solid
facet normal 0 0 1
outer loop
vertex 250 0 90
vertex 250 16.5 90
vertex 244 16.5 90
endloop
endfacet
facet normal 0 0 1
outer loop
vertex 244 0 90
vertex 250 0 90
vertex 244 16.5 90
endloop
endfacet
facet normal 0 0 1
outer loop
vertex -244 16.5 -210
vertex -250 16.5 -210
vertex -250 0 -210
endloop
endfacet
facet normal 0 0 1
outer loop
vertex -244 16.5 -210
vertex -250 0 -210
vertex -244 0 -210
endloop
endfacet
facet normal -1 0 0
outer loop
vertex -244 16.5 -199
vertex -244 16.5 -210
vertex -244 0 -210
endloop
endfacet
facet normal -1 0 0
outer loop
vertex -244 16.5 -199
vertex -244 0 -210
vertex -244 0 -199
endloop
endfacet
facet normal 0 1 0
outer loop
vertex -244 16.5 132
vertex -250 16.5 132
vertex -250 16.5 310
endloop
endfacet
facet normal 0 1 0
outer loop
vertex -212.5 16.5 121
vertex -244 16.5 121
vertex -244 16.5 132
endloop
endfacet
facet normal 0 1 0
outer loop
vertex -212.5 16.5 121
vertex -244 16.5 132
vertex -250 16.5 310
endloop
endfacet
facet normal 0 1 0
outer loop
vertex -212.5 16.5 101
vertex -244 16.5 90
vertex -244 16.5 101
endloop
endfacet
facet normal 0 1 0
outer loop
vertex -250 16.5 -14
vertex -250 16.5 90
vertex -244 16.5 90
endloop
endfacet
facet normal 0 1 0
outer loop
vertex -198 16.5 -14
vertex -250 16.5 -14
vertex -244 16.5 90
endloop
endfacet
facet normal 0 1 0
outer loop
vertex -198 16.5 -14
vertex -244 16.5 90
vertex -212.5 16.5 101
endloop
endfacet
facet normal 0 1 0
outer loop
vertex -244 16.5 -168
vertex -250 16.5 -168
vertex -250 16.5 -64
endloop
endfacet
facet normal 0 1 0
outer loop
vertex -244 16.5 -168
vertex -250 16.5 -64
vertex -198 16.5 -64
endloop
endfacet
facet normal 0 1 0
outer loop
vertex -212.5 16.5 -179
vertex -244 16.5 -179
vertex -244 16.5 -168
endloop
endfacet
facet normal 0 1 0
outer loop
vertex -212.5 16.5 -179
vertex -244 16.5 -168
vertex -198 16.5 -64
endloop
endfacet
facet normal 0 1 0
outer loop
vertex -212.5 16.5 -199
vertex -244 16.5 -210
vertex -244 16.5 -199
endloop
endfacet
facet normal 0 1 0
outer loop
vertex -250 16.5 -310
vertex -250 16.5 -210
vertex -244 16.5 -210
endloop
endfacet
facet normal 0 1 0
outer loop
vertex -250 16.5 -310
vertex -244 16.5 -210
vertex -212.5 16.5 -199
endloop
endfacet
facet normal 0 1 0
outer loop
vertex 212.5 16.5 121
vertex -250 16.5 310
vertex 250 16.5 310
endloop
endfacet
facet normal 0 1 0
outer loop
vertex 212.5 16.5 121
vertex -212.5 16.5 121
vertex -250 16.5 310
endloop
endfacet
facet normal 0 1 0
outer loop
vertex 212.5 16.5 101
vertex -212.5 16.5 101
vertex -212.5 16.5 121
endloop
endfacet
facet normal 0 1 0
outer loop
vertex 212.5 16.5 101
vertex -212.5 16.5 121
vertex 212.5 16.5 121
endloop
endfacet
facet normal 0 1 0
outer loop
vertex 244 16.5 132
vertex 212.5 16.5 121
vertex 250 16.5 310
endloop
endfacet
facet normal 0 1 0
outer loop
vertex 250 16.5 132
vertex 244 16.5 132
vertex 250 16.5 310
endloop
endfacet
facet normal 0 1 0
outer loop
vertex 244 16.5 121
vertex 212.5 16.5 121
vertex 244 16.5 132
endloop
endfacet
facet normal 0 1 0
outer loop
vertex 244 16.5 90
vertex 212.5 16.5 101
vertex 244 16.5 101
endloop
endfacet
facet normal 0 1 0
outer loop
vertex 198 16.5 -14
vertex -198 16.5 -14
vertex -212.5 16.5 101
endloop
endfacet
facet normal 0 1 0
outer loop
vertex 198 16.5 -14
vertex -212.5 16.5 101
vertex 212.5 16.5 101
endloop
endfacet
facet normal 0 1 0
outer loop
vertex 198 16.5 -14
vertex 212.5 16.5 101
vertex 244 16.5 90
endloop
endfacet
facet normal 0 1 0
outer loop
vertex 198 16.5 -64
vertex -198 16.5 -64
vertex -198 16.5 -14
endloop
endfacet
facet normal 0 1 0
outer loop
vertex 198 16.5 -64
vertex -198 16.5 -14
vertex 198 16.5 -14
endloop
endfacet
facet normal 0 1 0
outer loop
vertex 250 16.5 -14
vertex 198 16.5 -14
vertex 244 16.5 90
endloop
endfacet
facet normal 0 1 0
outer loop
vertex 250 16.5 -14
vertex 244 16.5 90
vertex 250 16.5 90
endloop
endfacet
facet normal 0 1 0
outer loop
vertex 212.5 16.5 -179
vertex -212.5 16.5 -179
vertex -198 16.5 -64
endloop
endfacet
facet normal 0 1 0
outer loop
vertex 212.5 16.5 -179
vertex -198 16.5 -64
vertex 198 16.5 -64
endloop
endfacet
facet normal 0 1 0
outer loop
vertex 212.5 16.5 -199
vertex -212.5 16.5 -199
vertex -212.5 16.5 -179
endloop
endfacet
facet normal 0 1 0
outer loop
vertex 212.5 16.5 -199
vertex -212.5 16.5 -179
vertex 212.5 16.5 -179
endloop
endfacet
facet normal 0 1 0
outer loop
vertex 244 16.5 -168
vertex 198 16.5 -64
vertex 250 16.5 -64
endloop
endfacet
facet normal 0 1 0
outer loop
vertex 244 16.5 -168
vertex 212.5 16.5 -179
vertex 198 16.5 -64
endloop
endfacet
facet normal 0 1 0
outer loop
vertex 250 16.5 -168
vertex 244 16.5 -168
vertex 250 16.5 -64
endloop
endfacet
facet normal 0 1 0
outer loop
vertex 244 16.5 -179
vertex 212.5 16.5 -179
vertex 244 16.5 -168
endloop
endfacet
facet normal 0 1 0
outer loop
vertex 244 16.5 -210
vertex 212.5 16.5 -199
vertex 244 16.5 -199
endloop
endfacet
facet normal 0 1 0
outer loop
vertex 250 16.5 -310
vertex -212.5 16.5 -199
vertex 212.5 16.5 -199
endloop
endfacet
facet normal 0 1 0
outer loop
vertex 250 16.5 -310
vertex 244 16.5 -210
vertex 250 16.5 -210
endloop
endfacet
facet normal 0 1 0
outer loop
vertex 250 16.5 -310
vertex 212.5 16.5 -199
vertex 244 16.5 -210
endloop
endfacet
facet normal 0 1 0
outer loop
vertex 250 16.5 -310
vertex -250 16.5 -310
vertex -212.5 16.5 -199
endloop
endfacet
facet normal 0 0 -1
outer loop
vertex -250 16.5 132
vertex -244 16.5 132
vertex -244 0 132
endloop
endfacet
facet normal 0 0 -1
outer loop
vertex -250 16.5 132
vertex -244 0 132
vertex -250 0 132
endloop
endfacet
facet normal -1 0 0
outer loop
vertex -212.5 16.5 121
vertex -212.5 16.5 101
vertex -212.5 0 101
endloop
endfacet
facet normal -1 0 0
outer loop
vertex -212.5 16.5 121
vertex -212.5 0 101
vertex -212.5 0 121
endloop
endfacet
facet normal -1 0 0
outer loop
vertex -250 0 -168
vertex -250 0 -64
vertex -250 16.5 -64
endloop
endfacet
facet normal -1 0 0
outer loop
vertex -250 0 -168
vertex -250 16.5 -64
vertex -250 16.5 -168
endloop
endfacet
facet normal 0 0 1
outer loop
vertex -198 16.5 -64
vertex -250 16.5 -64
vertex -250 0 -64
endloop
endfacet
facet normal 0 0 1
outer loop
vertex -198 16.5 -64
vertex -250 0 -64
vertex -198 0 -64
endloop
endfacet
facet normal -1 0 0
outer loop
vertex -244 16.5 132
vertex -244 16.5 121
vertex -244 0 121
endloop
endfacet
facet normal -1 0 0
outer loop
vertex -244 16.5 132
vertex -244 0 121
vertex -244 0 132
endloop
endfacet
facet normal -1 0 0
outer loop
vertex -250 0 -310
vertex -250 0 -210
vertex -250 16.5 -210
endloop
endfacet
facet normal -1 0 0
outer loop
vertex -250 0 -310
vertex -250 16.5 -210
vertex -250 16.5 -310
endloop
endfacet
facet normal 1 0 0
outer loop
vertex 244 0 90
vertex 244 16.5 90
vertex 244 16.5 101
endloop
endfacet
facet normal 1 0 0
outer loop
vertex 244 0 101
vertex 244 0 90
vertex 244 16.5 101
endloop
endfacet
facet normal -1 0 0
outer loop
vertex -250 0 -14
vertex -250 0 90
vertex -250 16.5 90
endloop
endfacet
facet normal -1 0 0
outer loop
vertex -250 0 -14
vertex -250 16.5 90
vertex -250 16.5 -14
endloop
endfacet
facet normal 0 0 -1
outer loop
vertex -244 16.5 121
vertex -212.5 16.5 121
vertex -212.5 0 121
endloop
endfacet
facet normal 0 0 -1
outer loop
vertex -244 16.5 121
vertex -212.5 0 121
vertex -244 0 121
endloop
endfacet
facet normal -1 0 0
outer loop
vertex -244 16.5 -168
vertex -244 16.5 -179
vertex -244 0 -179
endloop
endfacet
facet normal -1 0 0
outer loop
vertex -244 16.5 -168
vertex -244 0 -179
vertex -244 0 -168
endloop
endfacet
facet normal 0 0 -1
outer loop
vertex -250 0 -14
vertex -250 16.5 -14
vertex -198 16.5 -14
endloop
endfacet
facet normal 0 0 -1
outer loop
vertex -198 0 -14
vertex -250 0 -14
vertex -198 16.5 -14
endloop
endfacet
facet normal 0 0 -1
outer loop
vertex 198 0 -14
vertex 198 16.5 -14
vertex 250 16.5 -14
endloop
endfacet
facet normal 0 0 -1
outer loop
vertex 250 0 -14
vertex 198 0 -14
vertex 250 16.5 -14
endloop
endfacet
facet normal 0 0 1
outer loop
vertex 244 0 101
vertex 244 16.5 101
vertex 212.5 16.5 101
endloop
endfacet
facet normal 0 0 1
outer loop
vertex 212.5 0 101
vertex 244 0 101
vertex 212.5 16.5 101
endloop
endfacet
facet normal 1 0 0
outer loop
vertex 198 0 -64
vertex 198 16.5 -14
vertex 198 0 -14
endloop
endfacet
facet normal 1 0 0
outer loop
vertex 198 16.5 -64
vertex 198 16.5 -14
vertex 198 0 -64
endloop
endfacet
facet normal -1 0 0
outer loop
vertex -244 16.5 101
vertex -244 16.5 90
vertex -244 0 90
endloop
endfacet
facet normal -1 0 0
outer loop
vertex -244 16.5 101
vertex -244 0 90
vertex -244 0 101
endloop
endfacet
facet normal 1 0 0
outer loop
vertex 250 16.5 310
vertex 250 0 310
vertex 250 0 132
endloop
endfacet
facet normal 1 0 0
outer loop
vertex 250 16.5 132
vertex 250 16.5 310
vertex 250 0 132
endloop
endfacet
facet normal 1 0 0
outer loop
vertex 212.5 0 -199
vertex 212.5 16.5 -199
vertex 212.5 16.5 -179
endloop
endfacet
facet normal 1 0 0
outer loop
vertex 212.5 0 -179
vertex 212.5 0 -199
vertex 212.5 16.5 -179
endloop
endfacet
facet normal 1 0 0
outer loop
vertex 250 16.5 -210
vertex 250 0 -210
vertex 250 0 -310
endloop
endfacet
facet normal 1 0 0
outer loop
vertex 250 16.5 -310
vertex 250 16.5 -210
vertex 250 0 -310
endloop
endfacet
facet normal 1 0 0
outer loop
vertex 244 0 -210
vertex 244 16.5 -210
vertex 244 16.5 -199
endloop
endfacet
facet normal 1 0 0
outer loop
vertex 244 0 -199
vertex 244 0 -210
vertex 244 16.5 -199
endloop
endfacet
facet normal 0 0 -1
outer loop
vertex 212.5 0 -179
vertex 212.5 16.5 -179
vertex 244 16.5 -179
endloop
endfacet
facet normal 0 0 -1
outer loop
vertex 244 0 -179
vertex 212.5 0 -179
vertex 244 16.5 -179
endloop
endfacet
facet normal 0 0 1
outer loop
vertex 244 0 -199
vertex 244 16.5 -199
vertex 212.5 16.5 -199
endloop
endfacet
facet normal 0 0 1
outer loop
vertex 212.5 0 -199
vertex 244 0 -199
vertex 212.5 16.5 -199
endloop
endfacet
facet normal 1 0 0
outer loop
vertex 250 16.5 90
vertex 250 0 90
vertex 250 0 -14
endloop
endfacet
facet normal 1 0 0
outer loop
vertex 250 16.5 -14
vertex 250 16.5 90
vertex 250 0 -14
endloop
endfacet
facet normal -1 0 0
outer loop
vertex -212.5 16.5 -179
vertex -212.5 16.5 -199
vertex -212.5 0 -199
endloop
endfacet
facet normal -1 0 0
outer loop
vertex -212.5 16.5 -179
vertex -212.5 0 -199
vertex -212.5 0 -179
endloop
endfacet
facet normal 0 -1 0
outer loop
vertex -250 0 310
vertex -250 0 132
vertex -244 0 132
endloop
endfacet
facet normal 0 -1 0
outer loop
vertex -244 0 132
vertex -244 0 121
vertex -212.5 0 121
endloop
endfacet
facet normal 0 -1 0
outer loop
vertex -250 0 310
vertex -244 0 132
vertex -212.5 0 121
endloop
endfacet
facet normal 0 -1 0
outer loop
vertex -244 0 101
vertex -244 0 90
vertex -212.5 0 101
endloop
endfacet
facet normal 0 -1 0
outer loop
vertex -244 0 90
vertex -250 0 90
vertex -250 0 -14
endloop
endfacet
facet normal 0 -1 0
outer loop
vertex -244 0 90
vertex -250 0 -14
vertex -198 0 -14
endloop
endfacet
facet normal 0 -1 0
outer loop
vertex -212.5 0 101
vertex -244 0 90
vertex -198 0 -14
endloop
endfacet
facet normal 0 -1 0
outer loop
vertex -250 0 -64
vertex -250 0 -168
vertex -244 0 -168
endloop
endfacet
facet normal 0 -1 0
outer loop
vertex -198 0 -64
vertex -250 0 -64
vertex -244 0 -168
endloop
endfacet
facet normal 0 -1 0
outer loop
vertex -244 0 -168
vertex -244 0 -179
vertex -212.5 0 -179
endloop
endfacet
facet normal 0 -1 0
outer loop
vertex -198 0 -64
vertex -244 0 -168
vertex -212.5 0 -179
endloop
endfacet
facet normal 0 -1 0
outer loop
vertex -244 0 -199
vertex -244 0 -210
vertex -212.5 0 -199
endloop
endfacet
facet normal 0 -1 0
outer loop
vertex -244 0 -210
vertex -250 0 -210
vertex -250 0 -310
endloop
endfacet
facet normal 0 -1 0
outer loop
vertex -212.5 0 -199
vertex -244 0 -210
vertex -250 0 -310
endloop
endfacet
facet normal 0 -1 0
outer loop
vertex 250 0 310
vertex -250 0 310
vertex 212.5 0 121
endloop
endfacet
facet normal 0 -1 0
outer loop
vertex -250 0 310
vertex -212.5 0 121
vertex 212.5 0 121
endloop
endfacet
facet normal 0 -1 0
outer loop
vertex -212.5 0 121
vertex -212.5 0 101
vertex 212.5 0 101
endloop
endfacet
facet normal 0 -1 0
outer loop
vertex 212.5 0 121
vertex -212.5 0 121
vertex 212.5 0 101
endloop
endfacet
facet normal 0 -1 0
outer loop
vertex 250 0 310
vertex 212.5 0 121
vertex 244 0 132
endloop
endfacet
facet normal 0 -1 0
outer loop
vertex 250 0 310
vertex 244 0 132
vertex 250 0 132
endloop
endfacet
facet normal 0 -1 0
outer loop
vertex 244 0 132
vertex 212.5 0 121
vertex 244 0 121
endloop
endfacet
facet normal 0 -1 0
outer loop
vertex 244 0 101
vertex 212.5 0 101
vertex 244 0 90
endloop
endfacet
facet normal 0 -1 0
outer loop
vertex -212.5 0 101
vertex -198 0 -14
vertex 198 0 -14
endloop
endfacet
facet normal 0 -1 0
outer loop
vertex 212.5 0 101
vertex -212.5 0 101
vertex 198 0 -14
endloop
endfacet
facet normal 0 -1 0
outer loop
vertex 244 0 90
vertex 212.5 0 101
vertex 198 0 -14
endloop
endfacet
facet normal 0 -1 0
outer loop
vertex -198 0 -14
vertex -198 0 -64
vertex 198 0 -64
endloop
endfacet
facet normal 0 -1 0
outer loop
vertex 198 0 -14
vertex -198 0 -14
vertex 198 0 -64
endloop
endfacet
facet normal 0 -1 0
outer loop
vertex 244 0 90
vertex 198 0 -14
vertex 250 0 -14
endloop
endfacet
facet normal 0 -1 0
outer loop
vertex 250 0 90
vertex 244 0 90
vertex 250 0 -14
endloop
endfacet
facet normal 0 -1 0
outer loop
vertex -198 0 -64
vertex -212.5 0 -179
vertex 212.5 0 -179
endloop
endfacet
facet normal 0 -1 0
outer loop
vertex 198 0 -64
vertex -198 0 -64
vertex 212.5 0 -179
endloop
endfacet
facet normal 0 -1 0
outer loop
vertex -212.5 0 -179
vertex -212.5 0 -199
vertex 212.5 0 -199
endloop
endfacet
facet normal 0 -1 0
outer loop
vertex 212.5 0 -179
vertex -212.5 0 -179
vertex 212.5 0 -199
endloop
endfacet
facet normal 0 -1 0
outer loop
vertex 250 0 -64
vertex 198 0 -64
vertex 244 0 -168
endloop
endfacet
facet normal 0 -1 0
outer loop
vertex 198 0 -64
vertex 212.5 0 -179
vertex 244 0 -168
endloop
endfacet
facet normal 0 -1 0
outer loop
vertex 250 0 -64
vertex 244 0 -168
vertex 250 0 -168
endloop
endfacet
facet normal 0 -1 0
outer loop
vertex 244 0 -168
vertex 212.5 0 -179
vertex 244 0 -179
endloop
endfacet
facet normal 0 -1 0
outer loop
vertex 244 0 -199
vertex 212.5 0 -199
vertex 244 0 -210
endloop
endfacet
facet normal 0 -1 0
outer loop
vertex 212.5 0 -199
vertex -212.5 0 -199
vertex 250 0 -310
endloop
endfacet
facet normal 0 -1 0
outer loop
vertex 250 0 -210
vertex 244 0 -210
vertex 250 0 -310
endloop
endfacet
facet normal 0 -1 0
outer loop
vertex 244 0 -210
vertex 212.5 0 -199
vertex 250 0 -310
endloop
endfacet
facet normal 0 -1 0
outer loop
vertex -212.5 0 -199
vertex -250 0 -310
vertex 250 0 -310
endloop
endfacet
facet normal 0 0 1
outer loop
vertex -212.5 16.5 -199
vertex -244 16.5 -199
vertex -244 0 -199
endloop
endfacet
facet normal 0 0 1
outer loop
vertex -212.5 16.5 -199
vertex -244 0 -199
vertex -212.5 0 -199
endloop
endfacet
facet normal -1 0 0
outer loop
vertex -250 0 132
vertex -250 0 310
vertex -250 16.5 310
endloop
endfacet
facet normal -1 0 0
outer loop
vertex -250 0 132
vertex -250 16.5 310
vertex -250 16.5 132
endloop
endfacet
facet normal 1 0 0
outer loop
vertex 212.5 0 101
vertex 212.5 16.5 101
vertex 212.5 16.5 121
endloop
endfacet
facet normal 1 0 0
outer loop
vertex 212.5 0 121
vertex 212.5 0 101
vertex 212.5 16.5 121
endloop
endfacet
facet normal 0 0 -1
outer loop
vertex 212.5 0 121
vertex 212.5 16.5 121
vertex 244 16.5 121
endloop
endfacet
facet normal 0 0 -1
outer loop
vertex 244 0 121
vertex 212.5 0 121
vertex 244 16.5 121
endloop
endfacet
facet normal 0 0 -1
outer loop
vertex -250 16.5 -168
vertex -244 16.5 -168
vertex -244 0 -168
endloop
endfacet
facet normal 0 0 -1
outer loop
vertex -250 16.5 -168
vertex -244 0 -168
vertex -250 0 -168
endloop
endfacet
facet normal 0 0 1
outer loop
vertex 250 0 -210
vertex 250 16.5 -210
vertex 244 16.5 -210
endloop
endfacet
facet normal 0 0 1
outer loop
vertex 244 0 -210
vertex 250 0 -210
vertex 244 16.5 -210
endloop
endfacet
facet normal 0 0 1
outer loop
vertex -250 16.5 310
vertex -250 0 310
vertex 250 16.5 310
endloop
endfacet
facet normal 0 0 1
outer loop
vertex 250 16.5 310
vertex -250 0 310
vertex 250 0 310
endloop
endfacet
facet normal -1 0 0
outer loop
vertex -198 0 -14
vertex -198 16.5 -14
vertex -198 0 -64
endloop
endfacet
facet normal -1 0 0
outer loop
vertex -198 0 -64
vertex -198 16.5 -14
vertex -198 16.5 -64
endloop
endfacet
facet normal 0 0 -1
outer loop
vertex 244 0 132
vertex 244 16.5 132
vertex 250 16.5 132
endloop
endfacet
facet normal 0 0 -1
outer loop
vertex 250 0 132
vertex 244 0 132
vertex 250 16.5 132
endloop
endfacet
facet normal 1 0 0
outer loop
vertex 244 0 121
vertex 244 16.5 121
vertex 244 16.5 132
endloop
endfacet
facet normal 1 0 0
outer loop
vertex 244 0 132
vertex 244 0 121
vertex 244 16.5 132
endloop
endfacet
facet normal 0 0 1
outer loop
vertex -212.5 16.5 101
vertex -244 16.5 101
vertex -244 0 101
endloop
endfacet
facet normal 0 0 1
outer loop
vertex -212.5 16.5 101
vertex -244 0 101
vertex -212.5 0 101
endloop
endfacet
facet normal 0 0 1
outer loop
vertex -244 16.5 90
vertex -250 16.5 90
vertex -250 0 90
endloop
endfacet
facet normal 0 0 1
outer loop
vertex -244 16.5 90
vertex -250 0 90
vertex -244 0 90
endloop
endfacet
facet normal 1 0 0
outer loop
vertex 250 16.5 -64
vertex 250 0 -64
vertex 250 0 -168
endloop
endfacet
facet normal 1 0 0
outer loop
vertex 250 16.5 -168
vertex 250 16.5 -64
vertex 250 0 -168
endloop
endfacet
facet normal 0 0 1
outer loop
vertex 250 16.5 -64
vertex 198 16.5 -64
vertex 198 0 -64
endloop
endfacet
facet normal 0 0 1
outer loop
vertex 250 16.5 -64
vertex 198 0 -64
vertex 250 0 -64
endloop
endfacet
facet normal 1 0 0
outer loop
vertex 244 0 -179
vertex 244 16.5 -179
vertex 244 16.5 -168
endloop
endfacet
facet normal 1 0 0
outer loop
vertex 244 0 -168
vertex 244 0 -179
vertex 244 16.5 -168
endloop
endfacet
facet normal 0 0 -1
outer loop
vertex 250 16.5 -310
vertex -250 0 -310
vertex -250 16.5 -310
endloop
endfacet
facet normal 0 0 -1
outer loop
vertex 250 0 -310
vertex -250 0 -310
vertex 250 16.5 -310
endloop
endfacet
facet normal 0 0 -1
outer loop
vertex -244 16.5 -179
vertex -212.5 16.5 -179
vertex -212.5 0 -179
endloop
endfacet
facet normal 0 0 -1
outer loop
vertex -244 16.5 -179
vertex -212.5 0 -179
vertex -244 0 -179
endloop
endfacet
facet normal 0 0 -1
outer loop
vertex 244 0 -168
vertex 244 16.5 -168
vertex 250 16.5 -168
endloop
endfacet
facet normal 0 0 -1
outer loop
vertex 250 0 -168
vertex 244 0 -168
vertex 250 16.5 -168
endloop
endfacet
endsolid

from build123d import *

# Parameters (mm, degrees)
SKETCH1_W           = 500
SKETCH1_H           = 620
BOSS_EXTRUDE1_DEPTH = 16.5
SKETCH2_W           = 52
SKETCH2_H           = 50
CUT_EXTRUDE1_DEPTH  = 17.5


with BuildPart() as part:
    # Sketch1 → Boss-Extrude1 (new body)
    with BuildSketch(Plane(origin=(0, 0, 0), x_dir=(1, 0, 0), z_dir=(0, 1, 0))):
        Rectangle(SKETCH1_W, SKETCH1_H)
    extrude(amount=BOSS_EXTRUDE1_DEPTH)

    # Sketch2 → Cut-Extrude1 (cut, through all)
    with BuildSketch(Plane(origin=(0, 16.5, 0), x_dir=(1, 0, 0), z_dir=(0, 1, 0))):
        with Locations((-224, 39)):
            Rectangle(SKETCH2_W, SKETCH2_H)
        with Locations((224, 39)):
            Rectangle(SKETCH2_W, SKETCH2_H)
        Polygon((-250, 210), (-244, 210), (-244, 199), (-212.5, 199), (-212.5, 179), (-244, 179), (-244, 168), (-250, 168), align=None)
        Polygon((212.5, 199), (212.5, 179), (244, 179), (244, 168), (250, 168), (250, 210), (244, 210), (244, 199), align=None)
        Polygon((212.5, -101), (212.5, -121), (244, -121), (244, -132), (250, -132), (250, -90), (244, -90), (244, -101), align=None)
        Polygon((-250, -90), (-244, -90), (-244, -101), (-212.5, -101), (-212.5, -121), (-244, -121), (-244, -132), (-250, -132), align=None)
    extrude(amount=-CUT_EXTRUDE1_DEPTH, mode=Mode.SUBTRACT)


solid = part.part
